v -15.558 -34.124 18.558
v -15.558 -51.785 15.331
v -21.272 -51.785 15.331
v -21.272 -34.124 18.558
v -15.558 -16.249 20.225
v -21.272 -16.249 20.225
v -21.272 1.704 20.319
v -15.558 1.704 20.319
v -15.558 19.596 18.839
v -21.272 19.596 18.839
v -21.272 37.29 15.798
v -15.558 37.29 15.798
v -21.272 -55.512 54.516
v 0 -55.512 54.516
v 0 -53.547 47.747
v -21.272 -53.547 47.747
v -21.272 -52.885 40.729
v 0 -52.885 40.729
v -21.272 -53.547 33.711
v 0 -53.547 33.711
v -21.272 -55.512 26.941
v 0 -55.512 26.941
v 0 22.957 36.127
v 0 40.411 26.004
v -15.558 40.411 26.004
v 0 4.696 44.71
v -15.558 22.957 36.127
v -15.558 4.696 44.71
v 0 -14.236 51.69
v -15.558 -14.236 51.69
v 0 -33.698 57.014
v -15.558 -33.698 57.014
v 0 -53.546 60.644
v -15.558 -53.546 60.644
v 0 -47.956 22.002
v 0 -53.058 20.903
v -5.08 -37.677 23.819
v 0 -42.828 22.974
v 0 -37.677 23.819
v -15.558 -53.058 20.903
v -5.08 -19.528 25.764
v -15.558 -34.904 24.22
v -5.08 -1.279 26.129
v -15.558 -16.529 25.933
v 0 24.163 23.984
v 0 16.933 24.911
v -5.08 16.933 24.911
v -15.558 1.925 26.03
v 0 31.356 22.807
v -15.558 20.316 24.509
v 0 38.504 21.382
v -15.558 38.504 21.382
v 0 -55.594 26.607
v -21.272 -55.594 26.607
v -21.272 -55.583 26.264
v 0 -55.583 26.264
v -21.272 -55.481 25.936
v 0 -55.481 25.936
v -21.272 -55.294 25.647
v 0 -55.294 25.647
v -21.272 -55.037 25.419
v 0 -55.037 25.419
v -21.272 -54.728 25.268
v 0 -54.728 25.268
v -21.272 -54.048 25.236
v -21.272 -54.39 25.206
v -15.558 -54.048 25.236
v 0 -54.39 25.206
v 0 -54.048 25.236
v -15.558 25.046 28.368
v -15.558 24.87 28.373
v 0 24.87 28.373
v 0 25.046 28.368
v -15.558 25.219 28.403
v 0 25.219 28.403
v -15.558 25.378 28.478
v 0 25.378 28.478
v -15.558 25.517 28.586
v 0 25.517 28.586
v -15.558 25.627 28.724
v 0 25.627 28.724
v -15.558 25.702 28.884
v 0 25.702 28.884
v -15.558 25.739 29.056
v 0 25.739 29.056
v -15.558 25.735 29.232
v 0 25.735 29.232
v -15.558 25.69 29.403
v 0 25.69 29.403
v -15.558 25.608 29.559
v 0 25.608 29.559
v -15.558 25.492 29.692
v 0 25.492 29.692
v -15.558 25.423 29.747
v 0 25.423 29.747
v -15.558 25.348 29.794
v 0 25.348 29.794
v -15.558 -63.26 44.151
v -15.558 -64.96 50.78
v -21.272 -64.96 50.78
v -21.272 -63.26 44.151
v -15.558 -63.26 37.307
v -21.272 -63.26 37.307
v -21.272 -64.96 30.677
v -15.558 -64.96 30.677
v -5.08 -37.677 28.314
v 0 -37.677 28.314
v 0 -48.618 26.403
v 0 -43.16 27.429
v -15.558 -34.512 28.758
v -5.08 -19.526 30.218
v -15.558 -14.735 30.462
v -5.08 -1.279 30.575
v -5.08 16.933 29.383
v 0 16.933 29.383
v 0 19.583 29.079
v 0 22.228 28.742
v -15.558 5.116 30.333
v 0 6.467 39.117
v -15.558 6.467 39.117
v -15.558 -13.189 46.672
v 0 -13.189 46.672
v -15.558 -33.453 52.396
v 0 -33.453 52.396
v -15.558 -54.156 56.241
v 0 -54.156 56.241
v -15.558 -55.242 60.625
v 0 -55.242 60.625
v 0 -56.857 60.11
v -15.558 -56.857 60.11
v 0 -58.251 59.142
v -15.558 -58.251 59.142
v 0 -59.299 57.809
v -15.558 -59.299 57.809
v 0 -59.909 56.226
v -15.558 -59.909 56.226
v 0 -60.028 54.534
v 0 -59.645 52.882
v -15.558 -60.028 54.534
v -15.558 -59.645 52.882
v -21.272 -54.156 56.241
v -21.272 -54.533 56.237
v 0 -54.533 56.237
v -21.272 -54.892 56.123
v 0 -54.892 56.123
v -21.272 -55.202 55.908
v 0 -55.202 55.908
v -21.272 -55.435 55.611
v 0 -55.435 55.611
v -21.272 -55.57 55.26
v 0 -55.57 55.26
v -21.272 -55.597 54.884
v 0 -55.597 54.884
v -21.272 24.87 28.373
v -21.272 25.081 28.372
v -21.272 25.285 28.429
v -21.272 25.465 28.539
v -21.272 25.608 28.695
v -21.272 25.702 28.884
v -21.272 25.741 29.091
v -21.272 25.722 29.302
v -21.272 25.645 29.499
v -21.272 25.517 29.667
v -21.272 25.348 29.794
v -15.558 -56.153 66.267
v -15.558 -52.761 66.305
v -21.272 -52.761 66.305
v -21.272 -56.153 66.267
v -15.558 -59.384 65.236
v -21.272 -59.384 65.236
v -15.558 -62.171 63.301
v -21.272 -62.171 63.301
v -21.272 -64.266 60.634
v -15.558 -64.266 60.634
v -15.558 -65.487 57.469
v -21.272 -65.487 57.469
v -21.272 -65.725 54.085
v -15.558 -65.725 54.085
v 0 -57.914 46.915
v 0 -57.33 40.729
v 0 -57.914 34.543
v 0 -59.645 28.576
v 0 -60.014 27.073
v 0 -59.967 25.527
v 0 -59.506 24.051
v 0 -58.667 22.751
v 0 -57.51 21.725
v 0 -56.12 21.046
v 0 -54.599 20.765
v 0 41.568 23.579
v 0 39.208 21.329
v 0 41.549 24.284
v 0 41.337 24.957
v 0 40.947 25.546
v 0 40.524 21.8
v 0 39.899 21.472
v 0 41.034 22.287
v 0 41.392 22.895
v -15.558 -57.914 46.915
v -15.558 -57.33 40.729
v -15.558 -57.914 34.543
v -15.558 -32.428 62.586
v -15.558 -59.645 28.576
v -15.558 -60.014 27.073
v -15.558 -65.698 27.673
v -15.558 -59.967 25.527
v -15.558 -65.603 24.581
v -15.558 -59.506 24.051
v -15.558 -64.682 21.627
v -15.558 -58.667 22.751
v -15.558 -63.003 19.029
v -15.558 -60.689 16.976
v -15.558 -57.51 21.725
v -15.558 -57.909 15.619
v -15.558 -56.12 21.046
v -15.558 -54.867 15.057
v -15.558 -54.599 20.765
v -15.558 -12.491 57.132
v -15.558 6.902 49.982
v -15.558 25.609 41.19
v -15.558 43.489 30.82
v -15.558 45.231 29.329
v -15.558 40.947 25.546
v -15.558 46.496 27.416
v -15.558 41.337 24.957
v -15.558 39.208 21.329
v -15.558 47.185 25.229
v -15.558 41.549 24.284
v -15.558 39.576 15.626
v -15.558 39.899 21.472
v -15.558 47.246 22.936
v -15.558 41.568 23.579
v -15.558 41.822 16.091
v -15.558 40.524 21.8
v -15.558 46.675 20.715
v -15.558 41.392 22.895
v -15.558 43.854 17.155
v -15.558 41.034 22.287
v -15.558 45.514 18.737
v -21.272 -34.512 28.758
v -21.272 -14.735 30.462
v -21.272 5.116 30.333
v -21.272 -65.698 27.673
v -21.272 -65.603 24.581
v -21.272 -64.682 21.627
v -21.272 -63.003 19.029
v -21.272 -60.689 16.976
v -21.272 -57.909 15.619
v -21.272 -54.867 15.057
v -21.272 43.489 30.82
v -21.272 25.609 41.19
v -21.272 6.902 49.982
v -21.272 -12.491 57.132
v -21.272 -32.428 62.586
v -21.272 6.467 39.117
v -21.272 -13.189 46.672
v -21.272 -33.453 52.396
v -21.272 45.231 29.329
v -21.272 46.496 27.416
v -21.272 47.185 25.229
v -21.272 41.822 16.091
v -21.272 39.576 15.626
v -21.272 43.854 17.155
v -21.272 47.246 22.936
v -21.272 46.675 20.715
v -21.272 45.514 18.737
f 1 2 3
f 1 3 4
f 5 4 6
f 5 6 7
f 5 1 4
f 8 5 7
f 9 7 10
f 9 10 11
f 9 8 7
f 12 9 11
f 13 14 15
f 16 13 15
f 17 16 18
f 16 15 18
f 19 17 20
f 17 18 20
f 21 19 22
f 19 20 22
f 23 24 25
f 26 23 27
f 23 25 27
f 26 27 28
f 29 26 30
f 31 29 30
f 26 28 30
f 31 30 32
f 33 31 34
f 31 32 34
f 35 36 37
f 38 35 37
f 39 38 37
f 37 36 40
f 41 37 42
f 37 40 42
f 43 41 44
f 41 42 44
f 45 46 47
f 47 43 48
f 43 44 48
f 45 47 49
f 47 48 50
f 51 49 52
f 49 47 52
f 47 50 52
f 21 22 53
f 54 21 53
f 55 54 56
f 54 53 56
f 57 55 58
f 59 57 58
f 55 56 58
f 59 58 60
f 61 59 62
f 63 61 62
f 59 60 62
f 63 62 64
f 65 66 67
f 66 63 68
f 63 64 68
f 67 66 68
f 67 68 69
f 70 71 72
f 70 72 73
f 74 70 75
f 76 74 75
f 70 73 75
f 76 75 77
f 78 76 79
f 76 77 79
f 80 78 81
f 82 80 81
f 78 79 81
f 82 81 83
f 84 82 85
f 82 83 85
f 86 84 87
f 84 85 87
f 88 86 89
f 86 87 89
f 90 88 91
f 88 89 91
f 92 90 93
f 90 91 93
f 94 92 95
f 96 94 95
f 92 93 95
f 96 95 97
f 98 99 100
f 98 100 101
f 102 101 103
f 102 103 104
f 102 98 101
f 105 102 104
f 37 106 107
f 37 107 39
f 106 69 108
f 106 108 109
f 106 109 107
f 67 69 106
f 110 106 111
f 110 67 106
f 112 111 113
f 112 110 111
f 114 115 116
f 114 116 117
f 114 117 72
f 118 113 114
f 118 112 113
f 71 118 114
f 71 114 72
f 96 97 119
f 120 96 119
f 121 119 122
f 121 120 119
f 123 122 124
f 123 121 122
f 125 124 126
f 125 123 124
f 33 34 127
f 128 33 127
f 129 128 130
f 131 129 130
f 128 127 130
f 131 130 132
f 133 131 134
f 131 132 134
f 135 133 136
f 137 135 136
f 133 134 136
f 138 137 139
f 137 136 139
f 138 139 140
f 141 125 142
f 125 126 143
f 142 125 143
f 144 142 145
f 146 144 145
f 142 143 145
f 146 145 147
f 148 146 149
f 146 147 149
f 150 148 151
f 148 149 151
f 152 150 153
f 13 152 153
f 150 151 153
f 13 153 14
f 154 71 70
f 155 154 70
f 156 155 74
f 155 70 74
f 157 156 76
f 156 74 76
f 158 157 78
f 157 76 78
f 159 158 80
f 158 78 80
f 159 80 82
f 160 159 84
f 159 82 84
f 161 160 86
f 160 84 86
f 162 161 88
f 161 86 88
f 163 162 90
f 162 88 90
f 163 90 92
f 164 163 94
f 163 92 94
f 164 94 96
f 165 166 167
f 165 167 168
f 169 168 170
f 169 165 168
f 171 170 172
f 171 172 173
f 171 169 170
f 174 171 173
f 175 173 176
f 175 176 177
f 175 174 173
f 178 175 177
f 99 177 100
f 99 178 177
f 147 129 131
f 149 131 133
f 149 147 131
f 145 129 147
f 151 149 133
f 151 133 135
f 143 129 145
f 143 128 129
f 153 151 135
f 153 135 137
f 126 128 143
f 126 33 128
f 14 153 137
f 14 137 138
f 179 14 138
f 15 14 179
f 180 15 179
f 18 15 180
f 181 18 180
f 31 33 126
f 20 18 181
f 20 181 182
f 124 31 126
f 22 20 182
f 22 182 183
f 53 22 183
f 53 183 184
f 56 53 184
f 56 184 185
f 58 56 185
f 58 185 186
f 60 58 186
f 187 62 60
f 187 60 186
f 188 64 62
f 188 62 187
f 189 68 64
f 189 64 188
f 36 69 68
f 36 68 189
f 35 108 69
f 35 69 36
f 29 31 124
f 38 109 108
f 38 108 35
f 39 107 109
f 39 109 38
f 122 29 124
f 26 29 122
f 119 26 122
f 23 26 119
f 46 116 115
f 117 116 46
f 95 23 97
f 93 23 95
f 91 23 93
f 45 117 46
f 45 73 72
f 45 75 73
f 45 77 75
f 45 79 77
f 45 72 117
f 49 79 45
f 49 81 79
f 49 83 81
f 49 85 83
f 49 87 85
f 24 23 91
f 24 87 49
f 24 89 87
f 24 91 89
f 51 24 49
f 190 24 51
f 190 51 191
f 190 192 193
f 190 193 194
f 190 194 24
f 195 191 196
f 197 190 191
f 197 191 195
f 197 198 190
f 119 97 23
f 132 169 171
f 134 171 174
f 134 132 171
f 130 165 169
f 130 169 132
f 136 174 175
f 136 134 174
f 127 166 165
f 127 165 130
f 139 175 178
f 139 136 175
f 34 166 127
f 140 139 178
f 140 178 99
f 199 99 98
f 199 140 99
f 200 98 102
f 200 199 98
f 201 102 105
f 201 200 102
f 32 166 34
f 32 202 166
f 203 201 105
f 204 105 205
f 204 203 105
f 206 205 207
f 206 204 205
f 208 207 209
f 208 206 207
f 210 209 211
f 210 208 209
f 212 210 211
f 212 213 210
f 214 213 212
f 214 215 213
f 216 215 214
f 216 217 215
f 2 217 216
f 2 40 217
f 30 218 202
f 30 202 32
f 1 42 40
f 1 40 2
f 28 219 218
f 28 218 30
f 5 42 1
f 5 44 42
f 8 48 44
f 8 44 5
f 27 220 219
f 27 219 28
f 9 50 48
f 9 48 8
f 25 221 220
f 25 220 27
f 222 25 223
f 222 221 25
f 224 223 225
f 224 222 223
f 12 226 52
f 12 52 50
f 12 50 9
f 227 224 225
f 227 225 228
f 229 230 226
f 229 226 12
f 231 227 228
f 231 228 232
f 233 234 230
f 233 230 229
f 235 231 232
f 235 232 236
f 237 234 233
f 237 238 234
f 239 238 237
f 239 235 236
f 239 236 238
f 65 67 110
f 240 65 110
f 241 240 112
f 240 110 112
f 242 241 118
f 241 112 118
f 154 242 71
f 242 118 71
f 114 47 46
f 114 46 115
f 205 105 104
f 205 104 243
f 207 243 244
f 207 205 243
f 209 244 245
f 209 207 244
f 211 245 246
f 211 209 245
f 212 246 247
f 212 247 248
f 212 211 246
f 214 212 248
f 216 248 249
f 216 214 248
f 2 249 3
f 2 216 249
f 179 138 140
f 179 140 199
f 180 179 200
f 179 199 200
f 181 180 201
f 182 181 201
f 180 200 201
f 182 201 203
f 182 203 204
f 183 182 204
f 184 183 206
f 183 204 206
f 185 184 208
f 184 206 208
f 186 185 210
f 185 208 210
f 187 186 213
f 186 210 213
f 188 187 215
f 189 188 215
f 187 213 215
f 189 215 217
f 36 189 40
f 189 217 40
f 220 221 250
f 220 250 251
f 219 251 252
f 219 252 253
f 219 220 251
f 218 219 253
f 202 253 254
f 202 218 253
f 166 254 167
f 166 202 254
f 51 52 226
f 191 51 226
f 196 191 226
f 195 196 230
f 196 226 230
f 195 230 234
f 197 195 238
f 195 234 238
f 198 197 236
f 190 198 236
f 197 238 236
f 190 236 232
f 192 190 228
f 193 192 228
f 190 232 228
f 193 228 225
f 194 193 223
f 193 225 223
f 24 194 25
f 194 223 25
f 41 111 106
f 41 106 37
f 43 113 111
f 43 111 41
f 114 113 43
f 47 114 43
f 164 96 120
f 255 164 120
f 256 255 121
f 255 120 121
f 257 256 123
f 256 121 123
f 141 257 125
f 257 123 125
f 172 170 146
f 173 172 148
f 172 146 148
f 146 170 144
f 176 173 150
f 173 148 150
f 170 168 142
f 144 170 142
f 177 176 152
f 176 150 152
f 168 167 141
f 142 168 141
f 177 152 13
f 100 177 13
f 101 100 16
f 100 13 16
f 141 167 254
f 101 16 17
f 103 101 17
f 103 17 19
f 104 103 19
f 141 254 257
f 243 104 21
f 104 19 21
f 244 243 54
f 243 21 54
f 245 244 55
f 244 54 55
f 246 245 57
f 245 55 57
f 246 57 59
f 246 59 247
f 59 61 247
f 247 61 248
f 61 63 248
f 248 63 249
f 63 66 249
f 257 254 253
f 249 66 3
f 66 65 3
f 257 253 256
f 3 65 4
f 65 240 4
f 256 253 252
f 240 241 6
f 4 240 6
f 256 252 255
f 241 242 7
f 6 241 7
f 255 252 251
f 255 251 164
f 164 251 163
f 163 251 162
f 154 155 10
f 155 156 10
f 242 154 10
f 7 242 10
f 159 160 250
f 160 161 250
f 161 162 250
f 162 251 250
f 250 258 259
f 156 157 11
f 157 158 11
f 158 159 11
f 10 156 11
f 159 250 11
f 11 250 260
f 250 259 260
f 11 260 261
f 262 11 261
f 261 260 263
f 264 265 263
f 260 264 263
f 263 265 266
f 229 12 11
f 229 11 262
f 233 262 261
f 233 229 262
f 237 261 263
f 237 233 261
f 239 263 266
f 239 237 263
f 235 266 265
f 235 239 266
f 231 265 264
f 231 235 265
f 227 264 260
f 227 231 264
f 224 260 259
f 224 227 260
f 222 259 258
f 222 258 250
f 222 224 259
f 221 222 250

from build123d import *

# Parameters (mm, degrees)
BOSS_EXTRUDE1_DEPTH = 76.2
SKETCH2_W           = 6.985
SKETCH2_H           = 9.525
CUT_EXTRUDE1_DEPTH  = 119.84173867
CUT_EXTRUDE2_DEPTH  = 119.84173867
CUT_EXTRUDE3_DEPTH  = 119.84173867
CUT_EXTRUDE4_DEPTH  = 5.08
CUT_EXTRUDE6_DEPTH  = 36.83
FILLET2_R           = 0.762
BOSS_EXTRUDE2_DEPTH = 15.5575
FILLET3_R           = 0.762
BOSS_EXTRUDE3_DEPTH = 5.715
CUT_EXTRUDE7_START  = 5.08
CUT_EXTRUDE7_DEPTH  = 5.08


with BuildPart() as part:
    # Sketch1 → Boss-Extrude1 (new body)
    with BuildSketch(Plane.XY):
        Polygon((-15.5575, 76.2), (15.5575, 76.2), (15.5575, -76.2), (7.845485509, -76.2), (9.525, -85.725), (-9.525, -85.725), (-7.845485509, -76.2), (-15.5575, -76.2), align=None)
    extrude(amount=BOSS_EXTRUDE1_DEPTH)

    # Sketch2 → Cut-Extrude1 (cut, through all)
    with BuildSketch(Plane(origin=(15.5575, 0, 0), x_dir=(0, 0, -1), z_dir=(1, 0, 0))):
        with Locations((-3.4925, -80.9625)):
            Rectangle(SKETCH2_W, SKETCH2_H)
    extrude(amount=-CUT_EXTRUDE1_DEPTH, mode=Mode.SUBTRACT)

    # Sketch3 → Cut-Extrude2 (cut, through all)
    with BuildSketch(Plane(origin=(15.5575, 0, 0), x_dir=(0, 0, -1), z_dir=(1, 0, 0))):
        with BuildLine():
            Line((-76.2, -85.725), (-76.2, -76.2))
            Line((-76.2, -76.2), (-76.2, 76.2))
            Line((-76.2, 76.2), (-15.907508532, 76.2))
            ThreePointArc((-15.907508532, 76.2), (-60.637785123, 0.667838465), (-76.2, -85.725))
        make_face()
        with BuildLine():
            Line((0, -76.2), (0, 63.796446855))
            ThreePointArc((0, 63.796446855), (-12.85182234, -6.201776572), (0, -76.2))
        make_face()
    extrude(amount=-CUT_EXTRUDE2_DEPTH, mode=Mode.SUBTRACT)

    # Sketch6 → Cut-Extrude3 (cut, through all)
    with BuildSketch(Plane(origin=(15.5575, 0, 0), x_dir=(0, 0, -1), z_dir=(1, 0, 0))):
        with BuildLine():
            ThreePointArc((-26.004408293, 40.411420838), (-22.895186728, 41.391641282), (-21.382101704, 38.503966686))
            ThreePointArc((-21.382101704, 38.503966686), (-26.183938112, -7.303408092), (-20.902654077, -53.057984431))
            ThreePointArc((-20.902654077, -53.057984431), (-22.751384732, -58.666992363), (-28.575599954, -59.645405394))
            ThreePointArc((-28.575599954, -59.645405394), (-40.728748793, -57.329846812), (-52.881897632, -59.645405394))
            ThreePointArc((-52.881897632, -59.645405394), (-58.514495406, -58.82440967), (-60.644203683, -53.545722871))
            ThreePointArc((-60.644203683, -53.545722871), (-48.403726567, -4.694487773), (-26.004408293, 40.411420838))
        make_face()
    extrude(amount=-CUT_EXTRUDE3_DEPTH, mode=Mode.SUBTRACT)

    # Sketch7 → Cut-Extrude4 (cut, symmetric)
    with BuildSketch(Plane(origin=(0, 0, 0), x_dir=(0, 0, -1), z_dir=(1, 0, 0))):
        with BuildLine():
            Line((-24.910956945, 16.933040929), (-11.489033389, 16.933040929))
            ThreePointArc((-11.489033389, 16.933040929), (-12.80682615, -10.412600109), (-10.321792572, -37.676959071))
            Line((-10.321792572, -37.676959071), (-23.81904356, -37.676959071))
            ThreePointArc((-23.81904356, -37.676959071), (-26.144779891, -10.407545323), (-24.910956945, 16.933040929))
        make_face()
    extrude(amount=CUT_EXTRUDE4_DEPTH, both=True, mode=Mode.SUBTRACT)

    # Sketch10 → Cut-Extrude6 (cut, symmetric)
    with BuildSketch(Plane(origin=(15.5575, 76.2, 15.907508532), x_dir=(-1, 0, 0), z_dir=(0, -0.6148991463064188, -0.7886057569353888))):
        Polygon((0, 9.781513416), (8.255, 9.781513416), (0, -2.283486584), align=None)
        Polygon((31.115, 9.781513416), (31.115, -2.283486584), (22.86, 9.781513416), align=None)
    extrude(amount=CUT_EXTRUDE6_DEPTH, both=True, mode=Mode.SUBTRACT)

    # Fillet2
    fillet2_edges = [part.edges().sort_by_distance(p)[0] for p in [
        (0, 76.2, 15.907508532),
        (-14.77625063, 75.333628159, 16.653053168),
        (14.77625063, 75.333628159, 16.653053168),
        (-15.5575, 4.051612744, 59.349592349),
        (15.5575, 4.051612744, 59.349592349),
    ]]
    fillet(fillet2_edges, radius=FILLET2_R)


with BuildPart() as body_2:
    # Sketch11 → Boss-Extrude2 (new body)
    with BuildSketch(Plane(origin=(15.5575, 0, 0), x_dir=(0, 0, -1), z_dir=(1, 0, 0))):
        with BuildLine():
            ThreePointArc((-60.644203683, -53.545722871), (-58.514495406, -58.82440967), (-52.881897632, -59.645405394))
            ThreePointArc((-52.881897632, -59.645405394), (-40.728748793, -57.329846812), (-28.575599954, -59.645405394))
            ThreePointArc((-28.575599954, -59.645405394), (-22.751384732, -58.666992363), (-20.902654077, -53.057984431))
            ThreePointArc((-20.902654077, -53.057984431), (-26.183938112, -7.303408092), (-21.382101704, 38.503966686))
            ThreePointArc((-21.382101704, 38.503966686), (-22.895186728, 41.391641282), (-26.004408293, 40.411420838))
            ThreePointArc((-26.004408293, 40.411420838), (-48.403726567, -4.694487773), (-60.644203683, -53.545722871))
        make_face()
        with BuildLine():
            ThreePointArc((-56.241344514, -54.156342338), (-55.768076008, -55.329383849), (-54.516387613, -55.511827344))
            ThreePointArc((-54.516387613, -55.511827344), (-40.728748793, -52.884846812), (-26.941109972, -55.511827344))
            ThreePointArc((-26.941109972, -55.511827344), (-25.646839923, -55.294402226), (-25.236010888, -54.047956018))
            ThreePointArc((-25.236010888, -54.047956018), (-30.535382276, -12.638178349), (-27.725713329, 29.014658098))
            ThreePointArc((-27.725713329, 29.014658098), (-45.998284717, -11.194361196), (-56.241344514, -54.156342338))
        make_face(mode=Mode.SUBTRACT)
    extrude(amount=-BOSS_EXTRUDE2_DEPTH)

    # Fillet3
    fillet3_edges = [body_2.edges().sort_by_distance(p)[0] for p in [
        (7.77875, 29.014658098, 27.725713329),
    ]]
    fillet(fillet3_edges, radius=FILLET3_R)

    # Sketch13 → Cut-Extrude7 (cut)
    with BuildSketch(Plane(origin=(0, 0, 0), x_dir=(0, 0, -1), z_dir=(1, 0, 0)).offset(CUT_EXTRUDE7_START)):
        with BuildLine():
            Line((-11.489033389, 16.933040929), (-29.382511575, 16.933040929))
            ThreePointArc((-29.382511575, 16.933040929), (-30.590678841, -10.406069442), (-28.313574796, -37.676959071))
            Line((-28.313574796, -37.676959071), (-10.321792572, -37.676959071))
            ThreePointArc((-10.321792572, -37.676959071), (-12.80682615, -10.412600109), (-11.489033389, 16.933040929))
        make_face()
    extrude(amount=-CUT_EXTRUDE7_DEPTH, mode=Mode.SUBTRACT)


with BuildPart() as body_3:
    # Sketch12 → Boss-Extrude3 (new body)
    with BuildSketch(Plane(origin=(15.5575, 0, 0), x_dir=(0, 0, -1), z_dir=(1, 0, 0))):
        with BuildLine():
            ThreePointArc((-30.820115457, 43.488788141), (-53.765912925, -2.717575417), (-66.305022615, -52.760640699))
            ThreePointArc((-66.305022615, -52.760640699), (-62.045606061, -63.318014297), (-50.780410512, -64.960005745))
            ThreePointArc((-50.780410512, -64.960005745), (-40.728748793, -63.044846812), (-30.677087073, -64.960005745))
            ThreePointArc((-30.677087073, -64.960005745), (-19.028656629, -63.003179683), (-15.331195319, -51.785163819))
            ThreePointArc((-15.331195319, -51.785163819), (-20.469016461, -7.273482937), (-15.797619041, 37.289562147))
            ThreePointArc((-15.797619041, 37.289562147), (-20.715145369, 46.674504585), (-30.820115457, 43.488788141))
        make_face()
        with BuildLine():
            ThreePointArc((-56.241344514, -54.156342338), (-55.768076008, -55.329383849), (-54.516387613, -55.511827344))
            ThreePointArc((-54.516387613, -55.511827344), (-40.728748793, -52.884846812), (-26.941109972, -55.511827344))
            ThreePointArc((-26.941109972, -55.511827344), (-25.646839923, -55.294402226), (-25.236010888, -54.047956018))
            ThreePointArc((-25.236010888, -54.047956018), (-30.462301973, -14.734514328), (-28.372972672, 24.869721798))
            ThreePointArc((-28.372972672, 24.869721798), (-28.883789244, 25.702089435), (-29.794040566, 25.34823638))
            ThreePointArc((-29.794040566, 25.34823638), (-46.671799333, -13.18850949), (-56.241344514, -54.156342338))
        make_face(mode=Mode.SUBTRACT)
    extrude(amount=BOSS_EXTRUDE3_DEPTH)


with BuildPart() as body_2_1:
    add(body_2.part)

    # Combine1: union body 3
    add(body_3.part)


with BuildPart() as body_2_2:
    # Mirror1: mirrored copy
    add(body_2_1.part.mirror(Plane(origin=(0, -70.027902522, -58.200215313), x_dir=(0, 0, 1), z_dir=(1, 0, 0))))


solid = body_2_2.part
